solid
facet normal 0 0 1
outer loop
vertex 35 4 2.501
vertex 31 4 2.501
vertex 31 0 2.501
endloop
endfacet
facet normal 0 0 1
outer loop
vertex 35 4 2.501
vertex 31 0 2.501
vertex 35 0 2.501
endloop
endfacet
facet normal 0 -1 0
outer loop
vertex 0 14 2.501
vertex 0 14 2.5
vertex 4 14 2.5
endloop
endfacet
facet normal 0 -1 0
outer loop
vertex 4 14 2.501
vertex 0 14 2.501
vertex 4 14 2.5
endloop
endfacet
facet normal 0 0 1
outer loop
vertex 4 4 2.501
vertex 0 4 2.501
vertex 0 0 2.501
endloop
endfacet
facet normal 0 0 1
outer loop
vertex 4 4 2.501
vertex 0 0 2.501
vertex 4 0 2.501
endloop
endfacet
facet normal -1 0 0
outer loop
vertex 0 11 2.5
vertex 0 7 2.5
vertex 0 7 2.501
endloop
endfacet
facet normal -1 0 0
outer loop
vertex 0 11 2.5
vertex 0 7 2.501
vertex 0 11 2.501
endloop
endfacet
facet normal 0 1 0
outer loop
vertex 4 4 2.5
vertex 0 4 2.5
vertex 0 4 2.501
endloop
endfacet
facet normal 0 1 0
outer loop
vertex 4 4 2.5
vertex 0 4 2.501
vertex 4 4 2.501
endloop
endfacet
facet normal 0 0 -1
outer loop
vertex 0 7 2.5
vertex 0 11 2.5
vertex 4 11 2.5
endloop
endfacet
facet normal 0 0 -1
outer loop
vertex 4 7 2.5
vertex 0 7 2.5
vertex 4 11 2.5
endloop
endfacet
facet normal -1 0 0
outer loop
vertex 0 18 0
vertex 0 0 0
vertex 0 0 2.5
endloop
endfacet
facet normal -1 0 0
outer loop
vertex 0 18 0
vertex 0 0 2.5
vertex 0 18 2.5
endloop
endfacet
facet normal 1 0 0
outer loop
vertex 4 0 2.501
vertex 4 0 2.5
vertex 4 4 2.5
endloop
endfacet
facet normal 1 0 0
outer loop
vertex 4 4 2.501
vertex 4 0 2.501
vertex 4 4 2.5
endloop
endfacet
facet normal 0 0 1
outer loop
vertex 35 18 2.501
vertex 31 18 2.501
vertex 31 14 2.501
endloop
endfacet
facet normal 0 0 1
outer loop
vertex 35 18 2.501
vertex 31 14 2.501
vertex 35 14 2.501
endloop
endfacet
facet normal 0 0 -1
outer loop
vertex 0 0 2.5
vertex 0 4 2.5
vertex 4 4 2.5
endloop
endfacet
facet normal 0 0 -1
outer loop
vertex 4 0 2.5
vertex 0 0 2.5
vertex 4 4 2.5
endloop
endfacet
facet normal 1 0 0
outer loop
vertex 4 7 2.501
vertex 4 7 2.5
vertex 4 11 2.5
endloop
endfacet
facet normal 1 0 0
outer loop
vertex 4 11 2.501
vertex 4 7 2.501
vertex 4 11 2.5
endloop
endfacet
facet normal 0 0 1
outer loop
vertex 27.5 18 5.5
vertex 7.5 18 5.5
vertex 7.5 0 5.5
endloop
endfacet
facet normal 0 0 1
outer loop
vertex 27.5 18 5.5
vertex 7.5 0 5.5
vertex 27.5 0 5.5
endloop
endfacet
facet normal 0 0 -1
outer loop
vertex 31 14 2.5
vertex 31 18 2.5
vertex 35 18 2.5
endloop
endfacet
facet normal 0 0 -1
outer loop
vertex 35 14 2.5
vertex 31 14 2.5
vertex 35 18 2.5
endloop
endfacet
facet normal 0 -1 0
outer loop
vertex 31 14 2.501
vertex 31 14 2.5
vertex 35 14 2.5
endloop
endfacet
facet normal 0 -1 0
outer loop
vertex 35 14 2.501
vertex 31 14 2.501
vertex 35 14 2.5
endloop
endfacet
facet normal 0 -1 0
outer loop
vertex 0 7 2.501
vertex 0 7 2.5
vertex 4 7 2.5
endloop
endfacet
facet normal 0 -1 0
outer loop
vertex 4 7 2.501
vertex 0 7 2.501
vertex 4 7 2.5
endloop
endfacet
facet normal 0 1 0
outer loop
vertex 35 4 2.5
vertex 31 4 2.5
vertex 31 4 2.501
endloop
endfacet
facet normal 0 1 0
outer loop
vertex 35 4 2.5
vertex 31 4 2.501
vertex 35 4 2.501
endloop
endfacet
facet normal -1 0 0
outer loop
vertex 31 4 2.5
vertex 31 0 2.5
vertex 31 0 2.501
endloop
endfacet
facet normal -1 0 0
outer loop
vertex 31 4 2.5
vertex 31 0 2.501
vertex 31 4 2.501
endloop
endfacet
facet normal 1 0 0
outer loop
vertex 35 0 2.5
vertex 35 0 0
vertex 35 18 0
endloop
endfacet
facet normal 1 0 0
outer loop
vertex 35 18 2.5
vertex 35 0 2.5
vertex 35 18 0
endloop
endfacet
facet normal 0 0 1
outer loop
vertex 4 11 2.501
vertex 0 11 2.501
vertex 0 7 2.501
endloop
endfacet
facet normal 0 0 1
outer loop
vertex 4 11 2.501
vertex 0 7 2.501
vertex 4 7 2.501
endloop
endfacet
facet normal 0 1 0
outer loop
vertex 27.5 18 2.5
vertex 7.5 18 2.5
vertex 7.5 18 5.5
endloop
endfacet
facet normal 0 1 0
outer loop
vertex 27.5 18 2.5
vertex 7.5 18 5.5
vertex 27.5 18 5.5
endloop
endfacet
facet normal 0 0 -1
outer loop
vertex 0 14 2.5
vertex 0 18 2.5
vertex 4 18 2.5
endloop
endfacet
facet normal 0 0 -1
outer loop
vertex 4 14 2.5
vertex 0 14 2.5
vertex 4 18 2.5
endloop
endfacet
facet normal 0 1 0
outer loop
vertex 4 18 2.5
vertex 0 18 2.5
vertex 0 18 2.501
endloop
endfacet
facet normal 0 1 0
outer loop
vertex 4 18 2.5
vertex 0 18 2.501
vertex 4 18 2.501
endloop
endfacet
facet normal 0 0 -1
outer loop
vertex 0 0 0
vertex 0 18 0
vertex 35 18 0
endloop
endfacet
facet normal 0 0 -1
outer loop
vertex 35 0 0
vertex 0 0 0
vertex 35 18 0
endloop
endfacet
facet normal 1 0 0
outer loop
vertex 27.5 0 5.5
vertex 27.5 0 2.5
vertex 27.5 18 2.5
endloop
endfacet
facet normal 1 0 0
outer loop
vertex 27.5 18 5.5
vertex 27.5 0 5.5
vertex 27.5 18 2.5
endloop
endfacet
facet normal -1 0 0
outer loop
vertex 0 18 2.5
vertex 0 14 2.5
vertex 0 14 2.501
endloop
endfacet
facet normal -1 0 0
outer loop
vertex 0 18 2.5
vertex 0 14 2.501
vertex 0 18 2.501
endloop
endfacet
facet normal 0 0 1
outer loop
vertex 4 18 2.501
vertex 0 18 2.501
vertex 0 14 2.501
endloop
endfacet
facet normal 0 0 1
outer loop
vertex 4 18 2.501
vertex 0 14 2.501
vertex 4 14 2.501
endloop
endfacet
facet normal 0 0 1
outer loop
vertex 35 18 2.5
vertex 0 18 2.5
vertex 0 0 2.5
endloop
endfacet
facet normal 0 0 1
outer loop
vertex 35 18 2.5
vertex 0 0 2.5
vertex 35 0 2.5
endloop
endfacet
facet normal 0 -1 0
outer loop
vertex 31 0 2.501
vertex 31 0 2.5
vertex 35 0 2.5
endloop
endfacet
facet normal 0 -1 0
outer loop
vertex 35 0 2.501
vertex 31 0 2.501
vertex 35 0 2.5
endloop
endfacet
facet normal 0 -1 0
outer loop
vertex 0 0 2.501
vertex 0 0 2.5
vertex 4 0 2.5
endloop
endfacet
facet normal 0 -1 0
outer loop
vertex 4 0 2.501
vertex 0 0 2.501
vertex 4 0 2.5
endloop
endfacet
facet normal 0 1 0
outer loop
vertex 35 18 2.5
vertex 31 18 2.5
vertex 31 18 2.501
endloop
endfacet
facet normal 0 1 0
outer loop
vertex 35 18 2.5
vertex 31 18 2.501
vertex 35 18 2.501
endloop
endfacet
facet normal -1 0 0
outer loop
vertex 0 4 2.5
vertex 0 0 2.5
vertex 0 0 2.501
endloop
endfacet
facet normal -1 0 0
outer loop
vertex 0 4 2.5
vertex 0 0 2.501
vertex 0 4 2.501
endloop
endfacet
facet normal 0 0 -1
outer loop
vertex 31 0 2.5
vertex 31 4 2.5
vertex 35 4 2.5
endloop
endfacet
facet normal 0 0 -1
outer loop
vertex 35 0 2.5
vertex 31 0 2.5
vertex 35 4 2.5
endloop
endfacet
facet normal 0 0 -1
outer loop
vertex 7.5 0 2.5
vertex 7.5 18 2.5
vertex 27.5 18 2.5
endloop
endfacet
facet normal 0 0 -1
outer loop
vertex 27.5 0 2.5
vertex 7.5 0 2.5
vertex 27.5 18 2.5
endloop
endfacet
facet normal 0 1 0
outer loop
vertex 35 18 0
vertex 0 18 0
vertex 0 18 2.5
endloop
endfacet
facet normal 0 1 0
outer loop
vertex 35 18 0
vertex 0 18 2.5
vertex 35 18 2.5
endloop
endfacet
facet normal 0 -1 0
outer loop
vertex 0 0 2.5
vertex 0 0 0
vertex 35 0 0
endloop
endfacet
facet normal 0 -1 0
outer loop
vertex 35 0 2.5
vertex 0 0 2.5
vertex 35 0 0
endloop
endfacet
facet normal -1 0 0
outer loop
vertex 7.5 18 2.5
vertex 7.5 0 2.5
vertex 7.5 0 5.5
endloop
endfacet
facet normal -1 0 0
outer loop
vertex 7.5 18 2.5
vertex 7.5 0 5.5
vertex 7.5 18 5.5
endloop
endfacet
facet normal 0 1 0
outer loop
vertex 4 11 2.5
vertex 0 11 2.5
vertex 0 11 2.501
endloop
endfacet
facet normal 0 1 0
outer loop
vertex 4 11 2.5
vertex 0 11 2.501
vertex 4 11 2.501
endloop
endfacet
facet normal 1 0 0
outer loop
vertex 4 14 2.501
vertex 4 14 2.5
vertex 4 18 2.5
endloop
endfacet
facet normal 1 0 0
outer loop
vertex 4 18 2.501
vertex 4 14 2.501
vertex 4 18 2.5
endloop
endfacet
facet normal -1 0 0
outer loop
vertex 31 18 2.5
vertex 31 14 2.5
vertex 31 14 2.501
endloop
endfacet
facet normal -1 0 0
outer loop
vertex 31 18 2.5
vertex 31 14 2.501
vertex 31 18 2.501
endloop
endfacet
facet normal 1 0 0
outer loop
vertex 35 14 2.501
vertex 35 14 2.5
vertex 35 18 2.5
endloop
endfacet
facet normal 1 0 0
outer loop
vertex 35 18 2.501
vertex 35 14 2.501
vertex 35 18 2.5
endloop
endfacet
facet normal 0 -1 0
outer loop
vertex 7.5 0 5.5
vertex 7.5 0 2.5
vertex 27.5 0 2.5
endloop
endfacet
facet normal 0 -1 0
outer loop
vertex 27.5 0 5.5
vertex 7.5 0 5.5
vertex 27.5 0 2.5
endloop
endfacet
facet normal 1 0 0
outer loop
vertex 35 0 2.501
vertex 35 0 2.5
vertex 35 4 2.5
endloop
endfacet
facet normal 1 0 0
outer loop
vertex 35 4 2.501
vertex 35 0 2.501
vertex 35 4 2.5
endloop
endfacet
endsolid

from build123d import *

# Parameters (mm, degrees)
SKETCH1_W             = 35
SKETCH1_H             = 18
BOSS_EXTRUDE1_DEPTH   = 2.5
SKETCH2_W             = 20
SKETCH2_H             = 18
BOSS_EXTRUDE2_DEPTH   = 3
SKETCH3_W             = 4
SKETCH3_H             = 4
BOSS_EXTRUDE3_DEPTH   = 0.001
BOSS_EXTRUDE3_2_DEPTH = 0.001
BOSS_EXTRUDE3_3_DEPTH = 0.001
BOSS_EXTRUDE3_4_DEPTH = 0.001
BOSS_EXTRUDE3_5_DEPTH = 0.001


with BuildPart() as part:
    # Sketch1 → Boss-Extrude1 (new body)
    with BuildSketch(Plane.XY):
        with Locations((17.5, 9)):
            Rectangle(SKETCH1_W, SKETCH1_H)
    extrude(amount=BOSS_EXTRUDE1_DEPTH)


with BuildPart() as body_2:
    # Sketch2 → Boss-Extrude2 (new body)
    with BuildSketch(Plane.XY.offset(2.5)):
        with Locations((17.5, 9)):
            Rectangle(SKETCH2_W, SKETCH2_H)
    extrude(amount=BOSS_EXTRUDE2_DEPTH)


with BuildPart() as body_3:
    # Sketch3 → Boss-Extrude3 (new body)
    with BuildSketch(Plane.XY.offset(2.5)):
        with Locations((2, 16)):
            Rectangle(SKETCH3_W, SKETCH3_H)
    extrude(amount=BOSS_EXTRUDE3_DEPTH)


with BuildPart() as body_4:
    # Sketch3 → Boss-Extrude3 2 (new body)
    with BuildSketch(Plane.XY.offset(2.5)):
        with Locations((2, 9)):
            Rectangle(SKETCH3_W, SKETCH3_H)
    extrude(amount=BOSS_EXTRUDE3_2_DEPTH)


with BuildPart() as body_5:
    # Sketch3 → Boss-Extrude3 3 (new body)
    with BuildSketch(Plane.XY.offset(2.5)):
        with Locations((2, 2)):
            Rectangle(SKETCH3_W, SKETCH3_H)
    extrude(amount=BOSS_EXTRUDE3_3_DEPTH)


with BuildPart() as body_6:
    # Sketch3 → Boss-Extrude3 4 (new body)
    with BuildSketch(Plane.XY.offset(2.5)):
        with Locations((33, 16)):
            Rectangle(SKETCH3_W, SKETCH3_H)
    extrude(amount=BOSS_EXTRUDE3_4_DEPTH)


with BuildPart() as body_7:
    # Sketch3 → Boss-Extrude3 5 (new body)
    with BuildSketch(Plane.XY.offset(2.5)):
        with Locations((33, 2)):
            Rectangle(SKETCH3_W, SKETCH3_H)
    extrude(amount=BOSS_EXTRUDE3_5_DEPTH)


solid = Compound([part.part, body_2.part, body_3.part, body_4.part, body_5.part, body_6.part, body_7.part])
